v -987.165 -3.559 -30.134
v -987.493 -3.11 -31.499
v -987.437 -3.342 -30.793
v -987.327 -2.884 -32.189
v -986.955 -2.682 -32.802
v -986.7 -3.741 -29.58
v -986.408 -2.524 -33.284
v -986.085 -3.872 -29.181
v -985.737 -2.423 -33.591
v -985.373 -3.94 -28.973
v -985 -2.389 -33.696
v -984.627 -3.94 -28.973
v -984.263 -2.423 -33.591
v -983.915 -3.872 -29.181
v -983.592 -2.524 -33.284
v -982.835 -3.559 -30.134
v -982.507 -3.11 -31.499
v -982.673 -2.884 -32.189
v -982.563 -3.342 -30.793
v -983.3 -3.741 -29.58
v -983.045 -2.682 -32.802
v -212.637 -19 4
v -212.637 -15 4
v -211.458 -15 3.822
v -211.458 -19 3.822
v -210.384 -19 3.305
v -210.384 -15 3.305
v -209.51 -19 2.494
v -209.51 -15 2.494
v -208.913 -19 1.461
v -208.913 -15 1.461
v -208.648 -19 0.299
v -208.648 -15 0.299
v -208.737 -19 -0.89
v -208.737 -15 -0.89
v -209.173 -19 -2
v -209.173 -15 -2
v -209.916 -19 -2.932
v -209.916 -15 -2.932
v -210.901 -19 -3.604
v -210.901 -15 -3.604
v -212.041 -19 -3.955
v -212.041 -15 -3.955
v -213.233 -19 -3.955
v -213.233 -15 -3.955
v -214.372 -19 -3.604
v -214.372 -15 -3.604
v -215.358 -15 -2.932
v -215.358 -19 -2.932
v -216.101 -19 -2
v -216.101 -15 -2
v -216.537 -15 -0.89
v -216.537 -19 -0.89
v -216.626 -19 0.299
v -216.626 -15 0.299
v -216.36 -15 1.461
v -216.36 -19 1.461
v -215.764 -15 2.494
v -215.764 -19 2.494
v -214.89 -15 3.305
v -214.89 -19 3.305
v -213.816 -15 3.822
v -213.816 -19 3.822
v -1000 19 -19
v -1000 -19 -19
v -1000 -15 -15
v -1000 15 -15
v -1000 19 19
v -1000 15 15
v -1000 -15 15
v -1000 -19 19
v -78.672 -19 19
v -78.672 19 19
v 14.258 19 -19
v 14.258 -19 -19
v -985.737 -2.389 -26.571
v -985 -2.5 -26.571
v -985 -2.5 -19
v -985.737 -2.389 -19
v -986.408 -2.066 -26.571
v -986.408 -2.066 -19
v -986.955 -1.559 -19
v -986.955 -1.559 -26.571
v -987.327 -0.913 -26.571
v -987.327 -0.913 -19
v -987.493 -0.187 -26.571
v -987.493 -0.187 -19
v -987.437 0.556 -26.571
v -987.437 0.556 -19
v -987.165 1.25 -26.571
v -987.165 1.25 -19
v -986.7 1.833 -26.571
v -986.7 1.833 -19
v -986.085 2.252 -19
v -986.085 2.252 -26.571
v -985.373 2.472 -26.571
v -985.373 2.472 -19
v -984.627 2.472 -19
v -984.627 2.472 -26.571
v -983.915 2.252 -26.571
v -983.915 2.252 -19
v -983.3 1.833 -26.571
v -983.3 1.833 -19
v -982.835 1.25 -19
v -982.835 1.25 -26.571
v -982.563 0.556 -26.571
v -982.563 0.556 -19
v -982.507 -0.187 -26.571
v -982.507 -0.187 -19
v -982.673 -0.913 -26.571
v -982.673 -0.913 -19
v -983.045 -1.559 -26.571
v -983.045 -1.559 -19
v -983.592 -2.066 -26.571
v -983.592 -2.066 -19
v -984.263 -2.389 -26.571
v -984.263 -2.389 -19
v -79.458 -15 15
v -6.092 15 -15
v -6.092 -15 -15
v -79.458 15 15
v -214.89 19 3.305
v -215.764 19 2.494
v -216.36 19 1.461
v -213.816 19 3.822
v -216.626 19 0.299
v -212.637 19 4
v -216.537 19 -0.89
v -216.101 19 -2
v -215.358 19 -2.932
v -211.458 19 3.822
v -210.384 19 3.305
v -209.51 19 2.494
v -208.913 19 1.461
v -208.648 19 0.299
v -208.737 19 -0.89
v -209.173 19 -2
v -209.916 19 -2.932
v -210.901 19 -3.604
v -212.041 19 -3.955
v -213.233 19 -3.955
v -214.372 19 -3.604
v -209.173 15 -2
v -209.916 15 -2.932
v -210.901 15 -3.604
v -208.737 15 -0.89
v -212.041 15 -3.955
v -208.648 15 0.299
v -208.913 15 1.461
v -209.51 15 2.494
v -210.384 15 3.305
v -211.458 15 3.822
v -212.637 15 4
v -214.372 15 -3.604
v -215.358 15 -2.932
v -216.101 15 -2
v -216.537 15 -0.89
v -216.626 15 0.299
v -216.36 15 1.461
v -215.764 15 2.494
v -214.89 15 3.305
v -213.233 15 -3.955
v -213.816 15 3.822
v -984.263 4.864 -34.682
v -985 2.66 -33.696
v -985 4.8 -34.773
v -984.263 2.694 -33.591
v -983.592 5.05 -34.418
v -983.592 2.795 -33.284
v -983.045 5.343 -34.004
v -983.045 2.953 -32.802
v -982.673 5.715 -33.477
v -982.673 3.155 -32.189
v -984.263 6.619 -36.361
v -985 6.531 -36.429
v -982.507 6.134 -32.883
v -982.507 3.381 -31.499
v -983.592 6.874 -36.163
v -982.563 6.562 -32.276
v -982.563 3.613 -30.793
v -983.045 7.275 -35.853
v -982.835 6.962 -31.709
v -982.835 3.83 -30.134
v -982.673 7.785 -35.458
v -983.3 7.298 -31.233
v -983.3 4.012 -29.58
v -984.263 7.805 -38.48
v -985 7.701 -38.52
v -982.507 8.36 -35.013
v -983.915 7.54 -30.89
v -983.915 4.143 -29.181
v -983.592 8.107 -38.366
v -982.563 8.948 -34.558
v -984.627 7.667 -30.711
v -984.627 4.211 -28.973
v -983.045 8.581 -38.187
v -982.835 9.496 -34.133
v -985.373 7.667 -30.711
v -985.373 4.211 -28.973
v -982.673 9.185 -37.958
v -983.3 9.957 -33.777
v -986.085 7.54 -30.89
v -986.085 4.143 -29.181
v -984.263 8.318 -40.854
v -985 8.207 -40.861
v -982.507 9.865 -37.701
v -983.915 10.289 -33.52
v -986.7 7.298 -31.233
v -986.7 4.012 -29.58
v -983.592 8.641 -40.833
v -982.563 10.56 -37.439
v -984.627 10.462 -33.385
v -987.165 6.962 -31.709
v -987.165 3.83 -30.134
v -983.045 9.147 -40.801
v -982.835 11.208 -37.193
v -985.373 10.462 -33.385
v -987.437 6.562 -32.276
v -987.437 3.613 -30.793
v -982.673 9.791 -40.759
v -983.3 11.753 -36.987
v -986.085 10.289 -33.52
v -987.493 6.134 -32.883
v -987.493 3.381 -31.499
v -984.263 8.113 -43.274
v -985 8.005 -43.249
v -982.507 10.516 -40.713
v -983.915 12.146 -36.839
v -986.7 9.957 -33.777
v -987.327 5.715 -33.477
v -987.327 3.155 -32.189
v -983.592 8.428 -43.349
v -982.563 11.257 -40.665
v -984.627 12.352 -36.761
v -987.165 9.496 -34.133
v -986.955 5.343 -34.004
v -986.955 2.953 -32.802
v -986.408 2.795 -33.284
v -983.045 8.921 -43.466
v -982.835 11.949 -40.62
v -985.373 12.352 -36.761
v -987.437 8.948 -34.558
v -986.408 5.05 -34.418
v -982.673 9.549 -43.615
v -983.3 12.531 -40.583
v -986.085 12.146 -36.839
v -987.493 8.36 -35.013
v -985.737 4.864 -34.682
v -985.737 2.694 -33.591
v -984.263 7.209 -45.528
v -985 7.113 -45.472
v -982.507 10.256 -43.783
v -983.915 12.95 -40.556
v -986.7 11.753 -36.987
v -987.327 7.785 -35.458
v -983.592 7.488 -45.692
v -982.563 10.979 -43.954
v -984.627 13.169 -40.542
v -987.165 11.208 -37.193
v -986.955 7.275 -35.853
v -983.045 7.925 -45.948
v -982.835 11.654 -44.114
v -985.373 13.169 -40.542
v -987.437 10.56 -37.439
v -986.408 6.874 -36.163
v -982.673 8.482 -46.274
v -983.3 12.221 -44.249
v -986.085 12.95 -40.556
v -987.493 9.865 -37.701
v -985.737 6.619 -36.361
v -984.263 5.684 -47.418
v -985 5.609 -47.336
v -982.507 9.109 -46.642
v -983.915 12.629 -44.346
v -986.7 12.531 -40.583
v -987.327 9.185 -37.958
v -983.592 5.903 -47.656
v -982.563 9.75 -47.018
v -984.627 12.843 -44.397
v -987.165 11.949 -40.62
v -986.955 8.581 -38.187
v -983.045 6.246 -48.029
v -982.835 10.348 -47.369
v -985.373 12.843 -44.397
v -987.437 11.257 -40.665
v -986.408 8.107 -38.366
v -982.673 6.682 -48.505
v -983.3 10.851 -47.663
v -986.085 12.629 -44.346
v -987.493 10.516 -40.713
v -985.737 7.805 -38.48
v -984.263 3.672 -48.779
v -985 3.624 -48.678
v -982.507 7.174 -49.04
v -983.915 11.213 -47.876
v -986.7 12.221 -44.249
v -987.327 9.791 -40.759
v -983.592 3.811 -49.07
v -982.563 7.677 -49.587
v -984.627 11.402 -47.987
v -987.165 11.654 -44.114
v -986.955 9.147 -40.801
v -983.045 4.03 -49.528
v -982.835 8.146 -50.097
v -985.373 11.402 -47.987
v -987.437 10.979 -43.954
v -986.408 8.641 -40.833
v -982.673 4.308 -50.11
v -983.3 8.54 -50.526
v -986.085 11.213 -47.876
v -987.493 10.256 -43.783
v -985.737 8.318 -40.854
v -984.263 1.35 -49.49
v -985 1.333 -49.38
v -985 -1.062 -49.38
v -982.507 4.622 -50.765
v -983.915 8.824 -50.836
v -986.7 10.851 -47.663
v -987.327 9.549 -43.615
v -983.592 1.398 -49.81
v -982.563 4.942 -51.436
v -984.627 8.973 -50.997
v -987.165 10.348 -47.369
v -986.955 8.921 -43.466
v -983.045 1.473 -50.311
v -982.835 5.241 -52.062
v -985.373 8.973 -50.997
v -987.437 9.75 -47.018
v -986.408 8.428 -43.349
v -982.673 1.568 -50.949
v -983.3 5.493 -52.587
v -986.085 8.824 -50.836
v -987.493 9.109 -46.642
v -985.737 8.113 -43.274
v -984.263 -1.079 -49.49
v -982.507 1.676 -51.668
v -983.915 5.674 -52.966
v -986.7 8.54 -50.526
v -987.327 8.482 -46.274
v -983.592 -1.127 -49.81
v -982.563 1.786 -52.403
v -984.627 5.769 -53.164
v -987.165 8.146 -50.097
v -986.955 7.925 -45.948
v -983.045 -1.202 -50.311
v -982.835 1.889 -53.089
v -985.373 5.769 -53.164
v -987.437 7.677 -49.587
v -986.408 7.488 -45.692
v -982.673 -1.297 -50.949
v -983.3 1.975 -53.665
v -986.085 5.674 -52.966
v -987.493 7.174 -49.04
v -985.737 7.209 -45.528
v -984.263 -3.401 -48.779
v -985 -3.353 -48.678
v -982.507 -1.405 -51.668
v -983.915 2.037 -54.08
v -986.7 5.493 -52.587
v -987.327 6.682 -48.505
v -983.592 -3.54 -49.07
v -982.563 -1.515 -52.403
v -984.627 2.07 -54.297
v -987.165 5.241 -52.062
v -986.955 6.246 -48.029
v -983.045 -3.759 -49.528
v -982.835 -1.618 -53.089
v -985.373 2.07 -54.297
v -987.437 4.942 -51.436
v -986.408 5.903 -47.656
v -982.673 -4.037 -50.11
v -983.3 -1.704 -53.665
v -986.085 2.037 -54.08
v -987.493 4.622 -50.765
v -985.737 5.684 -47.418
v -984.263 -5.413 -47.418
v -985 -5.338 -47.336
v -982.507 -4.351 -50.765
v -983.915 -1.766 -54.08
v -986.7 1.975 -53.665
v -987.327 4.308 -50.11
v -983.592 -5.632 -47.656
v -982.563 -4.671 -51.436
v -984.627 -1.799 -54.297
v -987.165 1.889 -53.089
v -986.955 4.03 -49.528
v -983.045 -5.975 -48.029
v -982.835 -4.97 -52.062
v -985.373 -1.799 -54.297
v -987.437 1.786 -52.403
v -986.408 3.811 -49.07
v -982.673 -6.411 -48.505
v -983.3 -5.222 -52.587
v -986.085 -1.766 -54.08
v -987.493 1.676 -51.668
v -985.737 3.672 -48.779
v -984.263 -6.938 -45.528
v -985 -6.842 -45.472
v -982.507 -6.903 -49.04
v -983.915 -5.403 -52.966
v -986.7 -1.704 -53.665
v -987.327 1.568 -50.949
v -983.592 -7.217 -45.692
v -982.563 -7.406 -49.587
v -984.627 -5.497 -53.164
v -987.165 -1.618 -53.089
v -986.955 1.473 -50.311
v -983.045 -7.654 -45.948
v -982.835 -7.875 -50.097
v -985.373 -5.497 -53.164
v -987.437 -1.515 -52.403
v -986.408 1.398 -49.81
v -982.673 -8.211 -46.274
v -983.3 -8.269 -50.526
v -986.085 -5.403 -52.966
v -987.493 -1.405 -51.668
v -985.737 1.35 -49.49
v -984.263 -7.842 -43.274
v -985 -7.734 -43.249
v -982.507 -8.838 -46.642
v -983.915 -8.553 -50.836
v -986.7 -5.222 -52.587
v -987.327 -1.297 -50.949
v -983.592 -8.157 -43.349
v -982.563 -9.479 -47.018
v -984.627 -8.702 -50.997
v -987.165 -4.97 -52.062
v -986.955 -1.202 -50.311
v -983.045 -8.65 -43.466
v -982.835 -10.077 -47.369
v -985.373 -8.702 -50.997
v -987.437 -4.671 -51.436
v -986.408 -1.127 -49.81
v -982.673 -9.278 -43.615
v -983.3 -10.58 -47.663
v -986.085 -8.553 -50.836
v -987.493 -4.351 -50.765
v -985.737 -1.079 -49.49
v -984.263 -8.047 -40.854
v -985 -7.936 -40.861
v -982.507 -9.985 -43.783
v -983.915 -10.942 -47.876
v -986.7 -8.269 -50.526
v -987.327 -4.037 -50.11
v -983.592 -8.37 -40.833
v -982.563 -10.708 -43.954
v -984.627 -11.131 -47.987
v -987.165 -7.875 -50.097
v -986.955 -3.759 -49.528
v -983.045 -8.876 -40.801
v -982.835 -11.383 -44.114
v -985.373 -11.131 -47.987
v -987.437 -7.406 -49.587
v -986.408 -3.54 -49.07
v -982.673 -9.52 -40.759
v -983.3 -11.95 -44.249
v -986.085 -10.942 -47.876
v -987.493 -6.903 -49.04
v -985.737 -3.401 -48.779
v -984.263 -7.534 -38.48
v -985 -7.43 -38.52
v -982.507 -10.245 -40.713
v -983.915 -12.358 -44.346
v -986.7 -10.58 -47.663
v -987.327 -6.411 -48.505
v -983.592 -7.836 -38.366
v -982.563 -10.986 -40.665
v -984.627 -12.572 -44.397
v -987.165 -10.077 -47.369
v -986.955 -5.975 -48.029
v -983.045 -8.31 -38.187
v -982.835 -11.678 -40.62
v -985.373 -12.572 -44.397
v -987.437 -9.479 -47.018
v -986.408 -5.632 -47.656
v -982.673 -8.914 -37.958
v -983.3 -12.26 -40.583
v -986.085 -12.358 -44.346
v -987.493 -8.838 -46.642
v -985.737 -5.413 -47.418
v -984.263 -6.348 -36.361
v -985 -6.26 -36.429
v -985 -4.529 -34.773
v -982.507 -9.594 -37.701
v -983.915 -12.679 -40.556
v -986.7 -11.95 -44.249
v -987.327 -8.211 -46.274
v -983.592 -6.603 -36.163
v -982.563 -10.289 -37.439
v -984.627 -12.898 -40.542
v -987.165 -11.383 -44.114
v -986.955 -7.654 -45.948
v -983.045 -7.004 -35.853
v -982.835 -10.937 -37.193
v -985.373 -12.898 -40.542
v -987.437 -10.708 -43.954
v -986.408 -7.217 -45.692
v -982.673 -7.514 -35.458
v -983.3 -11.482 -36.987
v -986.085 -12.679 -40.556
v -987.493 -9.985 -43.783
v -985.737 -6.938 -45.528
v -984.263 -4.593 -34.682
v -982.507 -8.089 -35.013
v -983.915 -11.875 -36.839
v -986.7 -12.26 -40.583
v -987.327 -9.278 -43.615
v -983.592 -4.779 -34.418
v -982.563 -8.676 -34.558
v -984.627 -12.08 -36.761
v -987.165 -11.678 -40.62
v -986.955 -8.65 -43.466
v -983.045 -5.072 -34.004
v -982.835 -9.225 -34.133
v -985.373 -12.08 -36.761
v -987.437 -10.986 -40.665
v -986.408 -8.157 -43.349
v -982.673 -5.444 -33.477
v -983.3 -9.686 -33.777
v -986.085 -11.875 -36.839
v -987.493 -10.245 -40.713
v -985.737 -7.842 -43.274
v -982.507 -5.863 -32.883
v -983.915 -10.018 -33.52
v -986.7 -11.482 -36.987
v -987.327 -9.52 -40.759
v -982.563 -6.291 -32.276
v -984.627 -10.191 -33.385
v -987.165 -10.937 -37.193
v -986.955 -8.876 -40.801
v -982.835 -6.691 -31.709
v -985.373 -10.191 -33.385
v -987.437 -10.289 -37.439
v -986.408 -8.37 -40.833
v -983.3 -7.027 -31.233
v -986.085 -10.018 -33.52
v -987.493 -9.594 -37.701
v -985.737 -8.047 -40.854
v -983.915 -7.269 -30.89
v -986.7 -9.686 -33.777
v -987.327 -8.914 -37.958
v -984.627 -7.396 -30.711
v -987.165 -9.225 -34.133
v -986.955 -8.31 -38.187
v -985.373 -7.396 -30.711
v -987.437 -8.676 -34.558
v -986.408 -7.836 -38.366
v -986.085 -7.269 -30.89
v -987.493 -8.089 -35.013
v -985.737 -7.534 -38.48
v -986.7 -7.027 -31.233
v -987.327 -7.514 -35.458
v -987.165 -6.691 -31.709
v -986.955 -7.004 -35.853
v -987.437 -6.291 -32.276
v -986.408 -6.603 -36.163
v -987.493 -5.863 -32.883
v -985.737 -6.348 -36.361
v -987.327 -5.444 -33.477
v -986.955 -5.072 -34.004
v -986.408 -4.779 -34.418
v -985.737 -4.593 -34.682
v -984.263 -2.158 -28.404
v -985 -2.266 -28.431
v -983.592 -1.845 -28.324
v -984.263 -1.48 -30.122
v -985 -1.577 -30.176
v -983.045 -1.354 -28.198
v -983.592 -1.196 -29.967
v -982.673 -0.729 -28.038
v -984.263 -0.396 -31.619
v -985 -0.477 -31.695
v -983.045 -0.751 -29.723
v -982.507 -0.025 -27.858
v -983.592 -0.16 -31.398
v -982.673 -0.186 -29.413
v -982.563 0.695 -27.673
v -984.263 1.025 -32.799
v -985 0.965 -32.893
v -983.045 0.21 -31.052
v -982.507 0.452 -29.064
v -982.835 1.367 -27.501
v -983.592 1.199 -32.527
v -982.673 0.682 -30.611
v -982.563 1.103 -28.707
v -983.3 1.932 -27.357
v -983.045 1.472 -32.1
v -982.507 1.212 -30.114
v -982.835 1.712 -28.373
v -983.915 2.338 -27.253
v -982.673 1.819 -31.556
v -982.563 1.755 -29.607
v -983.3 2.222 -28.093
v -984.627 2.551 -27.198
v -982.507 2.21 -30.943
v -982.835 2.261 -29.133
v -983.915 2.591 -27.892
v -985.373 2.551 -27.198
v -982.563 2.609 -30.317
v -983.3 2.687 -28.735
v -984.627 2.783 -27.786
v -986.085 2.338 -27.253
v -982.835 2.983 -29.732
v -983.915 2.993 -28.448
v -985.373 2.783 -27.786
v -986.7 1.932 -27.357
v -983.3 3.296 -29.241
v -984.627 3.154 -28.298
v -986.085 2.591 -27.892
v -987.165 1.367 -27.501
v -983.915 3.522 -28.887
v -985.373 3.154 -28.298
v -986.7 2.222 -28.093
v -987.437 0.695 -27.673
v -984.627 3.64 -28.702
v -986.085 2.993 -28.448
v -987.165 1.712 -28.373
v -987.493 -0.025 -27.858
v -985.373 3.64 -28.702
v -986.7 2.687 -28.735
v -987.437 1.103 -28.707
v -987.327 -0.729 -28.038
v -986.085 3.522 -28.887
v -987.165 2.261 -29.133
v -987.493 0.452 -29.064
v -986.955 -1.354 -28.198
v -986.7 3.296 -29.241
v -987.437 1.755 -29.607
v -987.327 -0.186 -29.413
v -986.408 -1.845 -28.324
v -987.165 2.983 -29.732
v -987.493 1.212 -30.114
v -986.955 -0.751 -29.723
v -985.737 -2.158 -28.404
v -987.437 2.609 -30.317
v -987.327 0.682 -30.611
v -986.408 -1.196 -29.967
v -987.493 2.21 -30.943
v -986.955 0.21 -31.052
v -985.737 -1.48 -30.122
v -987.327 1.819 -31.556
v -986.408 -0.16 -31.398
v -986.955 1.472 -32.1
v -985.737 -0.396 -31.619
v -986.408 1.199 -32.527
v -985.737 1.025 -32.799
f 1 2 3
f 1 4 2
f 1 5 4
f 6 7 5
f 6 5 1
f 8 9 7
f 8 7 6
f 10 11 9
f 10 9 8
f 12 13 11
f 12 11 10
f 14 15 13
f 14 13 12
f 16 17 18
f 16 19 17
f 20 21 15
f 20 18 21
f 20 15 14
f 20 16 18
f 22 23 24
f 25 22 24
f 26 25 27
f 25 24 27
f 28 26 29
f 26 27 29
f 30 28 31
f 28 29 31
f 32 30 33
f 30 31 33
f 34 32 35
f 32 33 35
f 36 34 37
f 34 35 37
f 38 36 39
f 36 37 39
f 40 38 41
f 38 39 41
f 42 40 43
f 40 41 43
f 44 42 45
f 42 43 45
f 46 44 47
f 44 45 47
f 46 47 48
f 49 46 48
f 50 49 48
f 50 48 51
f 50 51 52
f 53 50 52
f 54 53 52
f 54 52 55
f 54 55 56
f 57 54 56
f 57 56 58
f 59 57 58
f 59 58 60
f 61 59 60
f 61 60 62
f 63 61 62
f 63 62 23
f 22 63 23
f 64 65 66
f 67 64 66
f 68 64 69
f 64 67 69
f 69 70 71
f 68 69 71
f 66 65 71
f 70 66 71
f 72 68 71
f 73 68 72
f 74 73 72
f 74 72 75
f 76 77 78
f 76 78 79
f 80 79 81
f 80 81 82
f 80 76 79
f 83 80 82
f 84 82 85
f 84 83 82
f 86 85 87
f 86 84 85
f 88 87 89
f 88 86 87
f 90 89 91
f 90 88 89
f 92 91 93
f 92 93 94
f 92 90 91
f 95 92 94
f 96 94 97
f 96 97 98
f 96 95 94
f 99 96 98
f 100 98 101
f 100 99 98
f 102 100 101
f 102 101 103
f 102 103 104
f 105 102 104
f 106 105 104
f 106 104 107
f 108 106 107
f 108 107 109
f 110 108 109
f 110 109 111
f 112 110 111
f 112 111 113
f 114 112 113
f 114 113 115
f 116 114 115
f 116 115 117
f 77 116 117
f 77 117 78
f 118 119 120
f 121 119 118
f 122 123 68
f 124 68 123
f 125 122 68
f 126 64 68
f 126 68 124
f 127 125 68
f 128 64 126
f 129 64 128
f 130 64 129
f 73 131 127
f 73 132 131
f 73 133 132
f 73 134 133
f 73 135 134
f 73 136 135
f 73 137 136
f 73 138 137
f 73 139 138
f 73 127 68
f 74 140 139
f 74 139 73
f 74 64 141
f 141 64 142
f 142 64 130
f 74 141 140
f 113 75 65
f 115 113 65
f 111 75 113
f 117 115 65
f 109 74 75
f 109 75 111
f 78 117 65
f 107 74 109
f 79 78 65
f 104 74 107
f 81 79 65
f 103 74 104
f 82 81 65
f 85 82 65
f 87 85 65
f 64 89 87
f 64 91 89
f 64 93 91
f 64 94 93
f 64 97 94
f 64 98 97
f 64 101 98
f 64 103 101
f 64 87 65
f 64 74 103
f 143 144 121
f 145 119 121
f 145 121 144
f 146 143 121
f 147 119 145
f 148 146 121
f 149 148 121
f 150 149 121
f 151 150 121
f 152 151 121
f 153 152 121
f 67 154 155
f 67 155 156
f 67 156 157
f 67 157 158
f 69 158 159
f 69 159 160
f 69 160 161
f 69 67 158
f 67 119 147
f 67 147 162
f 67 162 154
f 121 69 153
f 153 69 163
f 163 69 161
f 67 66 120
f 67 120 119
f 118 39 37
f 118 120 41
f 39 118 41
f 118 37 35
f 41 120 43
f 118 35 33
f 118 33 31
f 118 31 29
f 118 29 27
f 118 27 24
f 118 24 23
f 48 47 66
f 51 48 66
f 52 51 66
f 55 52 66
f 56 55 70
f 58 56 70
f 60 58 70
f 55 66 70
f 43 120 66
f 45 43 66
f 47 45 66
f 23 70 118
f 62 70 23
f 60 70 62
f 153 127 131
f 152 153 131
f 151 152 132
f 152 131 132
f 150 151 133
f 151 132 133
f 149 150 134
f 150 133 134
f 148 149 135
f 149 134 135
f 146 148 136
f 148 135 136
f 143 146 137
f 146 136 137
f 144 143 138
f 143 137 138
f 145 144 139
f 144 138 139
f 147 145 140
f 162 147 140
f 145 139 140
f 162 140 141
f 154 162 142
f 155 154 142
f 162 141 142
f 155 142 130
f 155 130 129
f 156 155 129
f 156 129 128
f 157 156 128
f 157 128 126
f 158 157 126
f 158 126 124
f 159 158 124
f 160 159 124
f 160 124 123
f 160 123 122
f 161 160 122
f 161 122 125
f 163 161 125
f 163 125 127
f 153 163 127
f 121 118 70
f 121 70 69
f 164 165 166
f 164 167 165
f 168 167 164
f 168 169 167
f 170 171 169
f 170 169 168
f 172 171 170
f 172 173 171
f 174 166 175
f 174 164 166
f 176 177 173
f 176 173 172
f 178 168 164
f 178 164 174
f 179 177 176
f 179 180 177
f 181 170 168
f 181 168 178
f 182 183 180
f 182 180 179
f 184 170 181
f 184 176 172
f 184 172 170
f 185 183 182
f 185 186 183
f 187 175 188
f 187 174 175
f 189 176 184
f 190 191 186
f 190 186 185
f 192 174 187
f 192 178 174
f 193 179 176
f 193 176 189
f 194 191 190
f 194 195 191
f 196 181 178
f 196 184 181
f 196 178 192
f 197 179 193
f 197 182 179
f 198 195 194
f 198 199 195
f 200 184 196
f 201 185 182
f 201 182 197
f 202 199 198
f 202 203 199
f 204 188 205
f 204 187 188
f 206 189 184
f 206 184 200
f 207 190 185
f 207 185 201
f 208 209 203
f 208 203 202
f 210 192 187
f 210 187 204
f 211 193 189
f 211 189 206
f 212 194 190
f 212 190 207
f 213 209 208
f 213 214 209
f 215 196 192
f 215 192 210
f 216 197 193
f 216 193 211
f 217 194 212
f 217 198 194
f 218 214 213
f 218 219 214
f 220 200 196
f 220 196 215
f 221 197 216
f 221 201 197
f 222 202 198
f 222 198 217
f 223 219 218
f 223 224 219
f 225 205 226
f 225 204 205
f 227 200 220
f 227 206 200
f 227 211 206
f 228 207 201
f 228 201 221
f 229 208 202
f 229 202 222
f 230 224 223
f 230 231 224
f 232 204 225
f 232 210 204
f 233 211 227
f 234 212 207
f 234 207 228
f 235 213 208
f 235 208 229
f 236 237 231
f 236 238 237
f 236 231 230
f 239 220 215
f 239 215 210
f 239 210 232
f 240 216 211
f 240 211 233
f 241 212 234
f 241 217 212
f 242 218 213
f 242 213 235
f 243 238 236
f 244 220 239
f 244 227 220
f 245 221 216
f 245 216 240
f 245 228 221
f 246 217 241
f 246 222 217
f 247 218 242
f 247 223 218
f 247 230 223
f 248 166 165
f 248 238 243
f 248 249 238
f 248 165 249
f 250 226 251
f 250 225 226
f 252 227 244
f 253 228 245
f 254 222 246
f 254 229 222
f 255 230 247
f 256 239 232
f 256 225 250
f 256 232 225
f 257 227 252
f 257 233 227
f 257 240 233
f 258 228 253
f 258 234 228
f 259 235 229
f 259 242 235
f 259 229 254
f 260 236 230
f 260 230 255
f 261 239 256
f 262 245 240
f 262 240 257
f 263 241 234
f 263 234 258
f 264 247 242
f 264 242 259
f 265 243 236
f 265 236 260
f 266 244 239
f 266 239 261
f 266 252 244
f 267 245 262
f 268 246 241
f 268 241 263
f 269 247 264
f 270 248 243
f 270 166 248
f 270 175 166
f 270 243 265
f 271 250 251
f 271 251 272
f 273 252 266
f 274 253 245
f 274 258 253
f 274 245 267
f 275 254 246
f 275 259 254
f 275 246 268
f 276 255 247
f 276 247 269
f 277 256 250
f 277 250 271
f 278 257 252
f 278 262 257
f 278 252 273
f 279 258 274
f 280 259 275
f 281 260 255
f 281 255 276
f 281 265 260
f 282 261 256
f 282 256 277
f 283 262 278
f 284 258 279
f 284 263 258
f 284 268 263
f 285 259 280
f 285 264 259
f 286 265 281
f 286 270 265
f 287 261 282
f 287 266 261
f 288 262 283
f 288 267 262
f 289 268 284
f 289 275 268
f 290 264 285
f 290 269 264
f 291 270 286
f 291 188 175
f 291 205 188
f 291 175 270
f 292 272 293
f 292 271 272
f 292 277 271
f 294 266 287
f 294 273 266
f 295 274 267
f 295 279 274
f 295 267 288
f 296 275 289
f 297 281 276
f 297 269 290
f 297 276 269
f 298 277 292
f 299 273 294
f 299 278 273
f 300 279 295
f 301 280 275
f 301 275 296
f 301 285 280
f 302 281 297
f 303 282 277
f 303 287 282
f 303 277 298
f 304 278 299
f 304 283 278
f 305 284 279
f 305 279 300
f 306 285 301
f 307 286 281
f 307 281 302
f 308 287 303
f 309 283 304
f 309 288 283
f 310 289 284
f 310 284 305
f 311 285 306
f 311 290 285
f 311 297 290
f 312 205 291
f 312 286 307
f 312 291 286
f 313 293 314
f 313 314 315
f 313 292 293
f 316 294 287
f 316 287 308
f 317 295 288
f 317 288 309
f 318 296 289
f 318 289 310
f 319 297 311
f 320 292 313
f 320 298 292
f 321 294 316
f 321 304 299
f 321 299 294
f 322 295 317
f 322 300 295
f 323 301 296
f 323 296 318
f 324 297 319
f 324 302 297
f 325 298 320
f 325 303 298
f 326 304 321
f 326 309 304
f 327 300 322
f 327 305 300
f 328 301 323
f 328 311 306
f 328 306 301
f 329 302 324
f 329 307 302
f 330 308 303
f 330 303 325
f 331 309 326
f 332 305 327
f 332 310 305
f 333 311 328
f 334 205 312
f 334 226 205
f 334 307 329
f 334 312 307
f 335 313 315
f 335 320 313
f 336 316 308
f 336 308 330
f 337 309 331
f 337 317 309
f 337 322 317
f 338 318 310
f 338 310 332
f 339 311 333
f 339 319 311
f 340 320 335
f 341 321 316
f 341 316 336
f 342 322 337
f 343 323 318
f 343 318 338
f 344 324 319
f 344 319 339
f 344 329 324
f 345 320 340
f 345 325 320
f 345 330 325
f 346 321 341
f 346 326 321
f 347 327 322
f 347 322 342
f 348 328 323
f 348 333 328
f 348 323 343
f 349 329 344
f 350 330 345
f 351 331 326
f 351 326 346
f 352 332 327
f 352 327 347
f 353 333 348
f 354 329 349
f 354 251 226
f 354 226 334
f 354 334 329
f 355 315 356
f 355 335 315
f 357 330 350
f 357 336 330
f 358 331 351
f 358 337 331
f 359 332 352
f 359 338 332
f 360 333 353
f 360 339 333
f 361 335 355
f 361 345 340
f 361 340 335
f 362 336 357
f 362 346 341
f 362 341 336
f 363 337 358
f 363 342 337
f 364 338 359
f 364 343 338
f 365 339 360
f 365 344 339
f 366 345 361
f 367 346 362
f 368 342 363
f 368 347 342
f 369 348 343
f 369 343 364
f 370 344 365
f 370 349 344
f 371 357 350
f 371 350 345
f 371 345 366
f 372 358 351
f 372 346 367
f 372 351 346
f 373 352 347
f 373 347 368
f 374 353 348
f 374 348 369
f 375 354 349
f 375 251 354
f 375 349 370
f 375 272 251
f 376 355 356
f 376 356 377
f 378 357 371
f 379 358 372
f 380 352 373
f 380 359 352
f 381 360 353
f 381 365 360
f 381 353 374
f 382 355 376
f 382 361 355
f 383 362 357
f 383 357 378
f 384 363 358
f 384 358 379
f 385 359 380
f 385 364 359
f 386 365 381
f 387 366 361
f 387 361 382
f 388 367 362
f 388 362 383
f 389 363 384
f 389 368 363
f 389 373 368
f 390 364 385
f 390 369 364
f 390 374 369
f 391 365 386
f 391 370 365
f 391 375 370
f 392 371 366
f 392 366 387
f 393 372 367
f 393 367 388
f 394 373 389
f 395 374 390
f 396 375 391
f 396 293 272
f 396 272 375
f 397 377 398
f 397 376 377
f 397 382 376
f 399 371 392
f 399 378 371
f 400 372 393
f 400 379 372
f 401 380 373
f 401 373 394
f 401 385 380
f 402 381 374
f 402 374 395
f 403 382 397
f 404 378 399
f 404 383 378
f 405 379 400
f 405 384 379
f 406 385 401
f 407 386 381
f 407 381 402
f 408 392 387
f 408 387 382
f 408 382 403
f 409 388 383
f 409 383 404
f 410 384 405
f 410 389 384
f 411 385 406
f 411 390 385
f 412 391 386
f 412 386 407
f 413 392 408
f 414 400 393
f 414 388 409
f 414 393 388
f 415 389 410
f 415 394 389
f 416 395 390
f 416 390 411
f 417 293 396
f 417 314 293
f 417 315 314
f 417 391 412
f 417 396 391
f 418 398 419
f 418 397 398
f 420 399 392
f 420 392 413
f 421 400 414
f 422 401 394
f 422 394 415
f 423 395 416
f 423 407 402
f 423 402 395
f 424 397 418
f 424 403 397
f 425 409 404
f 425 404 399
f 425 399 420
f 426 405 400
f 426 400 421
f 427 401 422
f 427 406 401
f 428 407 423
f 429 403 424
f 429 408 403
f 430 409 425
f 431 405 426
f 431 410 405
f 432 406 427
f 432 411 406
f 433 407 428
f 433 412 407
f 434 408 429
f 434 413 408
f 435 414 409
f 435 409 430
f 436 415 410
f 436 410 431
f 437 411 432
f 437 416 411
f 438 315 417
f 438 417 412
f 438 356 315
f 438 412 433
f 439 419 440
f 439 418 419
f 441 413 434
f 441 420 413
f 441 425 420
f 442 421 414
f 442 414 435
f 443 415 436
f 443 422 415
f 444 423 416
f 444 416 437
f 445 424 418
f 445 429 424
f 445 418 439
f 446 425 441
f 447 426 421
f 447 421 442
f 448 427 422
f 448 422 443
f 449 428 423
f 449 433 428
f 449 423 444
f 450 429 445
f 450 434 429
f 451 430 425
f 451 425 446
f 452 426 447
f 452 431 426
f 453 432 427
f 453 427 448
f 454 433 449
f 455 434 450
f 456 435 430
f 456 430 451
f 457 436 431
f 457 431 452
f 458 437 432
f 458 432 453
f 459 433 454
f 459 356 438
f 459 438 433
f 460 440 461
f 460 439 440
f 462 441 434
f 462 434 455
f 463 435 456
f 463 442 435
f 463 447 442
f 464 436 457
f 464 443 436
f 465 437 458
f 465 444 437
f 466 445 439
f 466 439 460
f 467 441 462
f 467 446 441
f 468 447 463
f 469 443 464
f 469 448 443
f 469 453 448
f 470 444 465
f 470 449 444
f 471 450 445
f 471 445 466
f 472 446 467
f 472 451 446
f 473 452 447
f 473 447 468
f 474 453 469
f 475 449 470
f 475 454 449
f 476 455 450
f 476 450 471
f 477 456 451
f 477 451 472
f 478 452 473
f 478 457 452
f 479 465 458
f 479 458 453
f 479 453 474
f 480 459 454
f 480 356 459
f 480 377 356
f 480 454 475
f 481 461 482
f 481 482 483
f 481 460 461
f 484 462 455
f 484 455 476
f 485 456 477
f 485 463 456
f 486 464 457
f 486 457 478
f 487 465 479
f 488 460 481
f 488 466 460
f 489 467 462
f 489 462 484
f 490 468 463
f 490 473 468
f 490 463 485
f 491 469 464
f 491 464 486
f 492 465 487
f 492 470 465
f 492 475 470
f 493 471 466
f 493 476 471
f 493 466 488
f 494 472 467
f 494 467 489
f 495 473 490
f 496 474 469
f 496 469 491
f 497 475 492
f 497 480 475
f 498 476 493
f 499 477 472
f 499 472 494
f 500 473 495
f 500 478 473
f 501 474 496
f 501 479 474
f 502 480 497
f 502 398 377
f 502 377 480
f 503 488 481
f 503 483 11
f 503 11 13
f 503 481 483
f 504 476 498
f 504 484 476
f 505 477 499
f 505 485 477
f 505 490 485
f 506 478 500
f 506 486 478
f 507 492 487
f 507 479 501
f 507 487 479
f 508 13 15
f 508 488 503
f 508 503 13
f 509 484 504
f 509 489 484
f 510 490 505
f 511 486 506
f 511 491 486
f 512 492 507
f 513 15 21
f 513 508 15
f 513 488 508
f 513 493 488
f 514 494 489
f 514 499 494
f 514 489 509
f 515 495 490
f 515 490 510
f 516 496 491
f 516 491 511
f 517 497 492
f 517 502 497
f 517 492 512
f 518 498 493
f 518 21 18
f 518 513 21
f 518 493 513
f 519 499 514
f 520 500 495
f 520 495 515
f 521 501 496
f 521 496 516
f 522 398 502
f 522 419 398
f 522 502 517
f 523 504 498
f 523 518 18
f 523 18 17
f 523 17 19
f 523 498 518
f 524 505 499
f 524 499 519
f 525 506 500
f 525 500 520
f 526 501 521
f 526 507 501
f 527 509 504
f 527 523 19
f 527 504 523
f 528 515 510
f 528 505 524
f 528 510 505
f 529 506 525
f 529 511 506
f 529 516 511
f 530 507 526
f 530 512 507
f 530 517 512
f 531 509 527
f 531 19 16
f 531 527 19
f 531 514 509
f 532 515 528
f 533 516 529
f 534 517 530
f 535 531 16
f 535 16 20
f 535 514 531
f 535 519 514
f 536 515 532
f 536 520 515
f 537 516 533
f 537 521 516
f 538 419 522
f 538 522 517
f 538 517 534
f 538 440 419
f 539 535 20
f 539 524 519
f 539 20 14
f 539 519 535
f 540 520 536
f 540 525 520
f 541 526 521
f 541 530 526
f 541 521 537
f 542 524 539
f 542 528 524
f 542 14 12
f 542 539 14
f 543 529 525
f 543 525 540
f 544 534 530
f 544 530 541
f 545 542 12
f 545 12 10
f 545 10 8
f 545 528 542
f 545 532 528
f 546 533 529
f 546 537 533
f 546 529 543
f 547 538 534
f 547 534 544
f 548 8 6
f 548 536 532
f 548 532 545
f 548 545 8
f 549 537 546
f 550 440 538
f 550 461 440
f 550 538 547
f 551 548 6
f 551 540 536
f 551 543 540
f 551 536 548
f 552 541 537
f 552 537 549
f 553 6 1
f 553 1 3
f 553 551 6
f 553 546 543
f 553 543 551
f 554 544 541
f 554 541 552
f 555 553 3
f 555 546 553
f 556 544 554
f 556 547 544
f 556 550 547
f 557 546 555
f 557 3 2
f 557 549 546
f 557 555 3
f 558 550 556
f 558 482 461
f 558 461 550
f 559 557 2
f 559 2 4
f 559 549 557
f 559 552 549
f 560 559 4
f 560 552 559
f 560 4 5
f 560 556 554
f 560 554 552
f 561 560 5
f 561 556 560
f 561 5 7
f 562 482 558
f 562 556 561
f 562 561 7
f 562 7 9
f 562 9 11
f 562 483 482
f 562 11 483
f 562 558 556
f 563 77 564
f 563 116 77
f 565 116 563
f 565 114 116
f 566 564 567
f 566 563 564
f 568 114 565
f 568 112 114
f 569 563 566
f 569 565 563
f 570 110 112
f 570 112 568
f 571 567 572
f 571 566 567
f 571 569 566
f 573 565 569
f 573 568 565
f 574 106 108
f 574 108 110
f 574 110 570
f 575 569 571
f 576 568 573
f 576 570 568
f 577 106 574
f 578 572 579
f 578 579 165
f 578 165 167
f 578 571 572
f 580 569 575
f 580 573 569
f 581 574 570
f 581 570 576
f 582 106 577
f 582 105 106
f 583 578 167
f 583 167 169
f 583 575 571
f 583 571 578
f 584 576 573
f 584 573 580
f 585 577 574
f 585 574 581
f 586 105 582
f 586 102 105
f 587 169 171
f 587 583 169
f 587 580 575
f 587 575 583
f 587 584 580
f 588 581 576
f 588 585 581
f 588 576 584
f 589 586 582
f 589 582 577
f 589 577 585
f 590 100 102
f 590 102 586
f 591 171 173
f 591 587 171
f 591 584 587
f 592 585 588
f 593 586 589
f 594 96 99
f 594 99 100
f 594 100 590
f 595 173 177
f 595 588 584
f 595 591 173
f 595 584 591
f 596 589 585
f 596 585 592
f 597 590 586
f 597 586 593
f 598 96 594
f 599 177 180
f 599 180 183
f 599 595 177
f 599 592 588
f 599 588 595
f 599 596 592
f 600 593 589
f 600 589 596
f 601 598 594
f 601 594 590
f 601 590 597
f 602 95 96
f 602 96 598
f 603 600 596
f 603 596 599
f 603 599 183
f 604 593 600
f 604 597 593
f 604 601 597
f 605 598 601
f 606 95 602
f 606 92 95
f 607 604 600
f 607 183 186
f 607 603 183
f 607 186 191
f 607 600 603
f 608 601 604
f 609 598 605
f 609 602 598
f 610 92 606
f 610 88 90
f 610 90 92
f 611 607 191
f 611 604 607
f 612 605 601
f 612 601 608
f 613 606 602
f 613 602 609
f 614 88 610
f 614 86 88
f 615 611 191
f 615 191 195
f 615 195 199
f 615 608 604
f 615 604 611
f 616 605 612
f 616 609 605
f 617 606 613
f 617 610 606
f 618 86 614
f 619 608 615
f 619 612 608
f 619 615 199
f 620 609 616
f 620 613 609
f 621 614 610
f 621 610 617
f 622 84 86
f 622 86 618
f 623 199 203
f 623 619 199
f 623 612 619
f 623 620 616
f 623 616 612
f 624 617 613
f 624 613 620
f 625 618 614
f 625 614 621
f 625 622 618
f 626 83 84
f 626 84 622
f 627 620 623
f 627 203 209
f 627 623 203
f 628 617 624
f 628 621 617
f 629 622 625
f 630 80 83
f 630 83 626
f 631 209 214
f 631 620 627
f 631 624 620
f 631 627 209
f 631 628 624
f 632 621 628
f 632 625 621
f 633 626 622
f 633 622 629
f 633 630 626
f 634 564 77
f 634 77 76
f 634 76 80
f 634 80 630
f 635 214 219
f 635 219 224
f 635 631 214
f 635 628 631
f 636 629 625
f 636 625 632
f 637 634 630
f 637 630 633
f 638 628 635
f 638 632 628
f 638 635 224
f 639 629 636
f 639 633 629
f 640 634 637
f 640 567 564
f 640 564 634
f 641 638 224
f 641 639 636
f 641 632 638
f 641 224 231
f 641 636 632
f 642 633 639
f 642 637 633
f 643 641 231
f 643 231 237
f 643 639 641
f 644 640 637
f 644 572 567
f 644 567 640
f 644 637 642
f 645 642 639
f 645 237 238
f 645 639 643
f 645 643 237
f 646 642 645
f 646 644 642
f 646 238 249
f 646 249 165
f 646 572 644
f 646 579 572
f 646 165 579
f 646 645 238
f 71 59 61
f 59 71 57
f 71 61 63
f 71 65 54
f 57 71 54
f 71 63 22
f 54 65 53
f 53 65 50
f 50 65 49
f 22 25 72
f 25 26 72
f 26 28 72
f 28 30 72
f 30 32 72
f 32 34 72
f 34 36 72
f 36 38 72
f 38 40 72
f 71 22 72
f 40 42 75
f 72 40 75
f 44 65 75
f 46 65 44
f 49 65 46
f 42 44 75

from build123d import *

# Parameters (mm, degrees)
SKETCH2_W           = 38
SKETCH2_H           = 38
SKETCH3_W           = 30
SKETCH3_H           = 30
SKETCH4_R           = 4
CUT_EXTRUDE1_DEPTH  = 1001.902093114
SWEEP2_PROFILE_R    = 2.5
CUT_EXTRUDE2_DEPTH  = 1003.203029253
BOSS_EXTRUDE1_DEPTH = 38
SKETCH22_W          = 30
SKETCH22_H          = 30
CUT_EXTRUDE3_DEPTH  = 1074.472400545
CUT_EXTRUDE4_DEPTH  = 1003.203029253
CUT_EXTRUDE5_DEPTH  = 1003.203029253
BOSS_EXTRUDE2_REACH = 1004.203


with BuildPart() as part:
    # Sweep1: sweep along a path in Sketch1
    with BuildLine(Plane(origin=(0, 0, 0), x_dir=(1, 0, 0), z_dir=(0, 1, 0))) as sweep1_path:
        Line((0, 0), (-1000, 0))
    # Sketch2 → Sweep1 (sweep)
    with BuildSketch(Plane(origin=(0, 0, 0), x_dir=(0, 0, -1), z_dir=(1, 0, 0))):
        Rectangle(SKETCH2_W, SKETCH2_H)
    sweep(path=sweep1_path.line)

    # Cut-Sweep1: sweep along a path in Sketch1<2>
    with BuildLine(Plane(origin=(0, 0, 0), x_dir=(1, 0, 0), z_dir=(0, 1, 0))) as cut_sweep1_path:
        Line((0, 0), (-1000, 0))
    # Sketch3 → Cut-Sweep1 (sweep, cut)
    with BuildSketch(Plane(origin=(0, 0, 0), x_dir=(0, 0, -1), z_dir=(1, 0, 0))):
        Rectangle(SKETCH3_W, SKETCH3_H)
    sweep(path=cut_sweep1_path.line, mode=Mode.SUBTRACT)

    # Sketch4 → Cut-Extrude1 (cut, through all)
    with BuildSketch(Plane(origin=(0, 19, 0), x_dir=(1, 0, 0), z_dir=(0, 1, 0))):
        with Locations((-212.63683242, 0)):
            Circle(SKETCH4_R)
    extrude(amount=-CUT_EXTRUDE1_DEPTH, mode=Mode.SUBTRACT)

    # Sweep2: sweep along a path in Sketch5
    with BuildLine(Plane.ZY.offset(985)) as sweep2_path:
        Line((-19, 0), (-26.570946825, 0))
        ThreePointArc((-26.570946825, 0), (-29.503401087, 0.950220747), (-31.321263798, 3.4397152))
        ThreePointArc((-31.321263798, 3.4397152), (-51.969366005, 0.135523131), (-31.321263798, -3.168668939))
    # Sweep2 profile (on start of the path) → Sweep2 (sweep)
    with BuildSketch(Plane(origin=(-985, 0, -19), x_dir=(0, -1, 0), z_dir=(0, 0, -1))):
        Circle(SWEEP2_PROFILE_R)
    sweep(path=sweep2_path.line)

    # Sketch16 → Cut-Extrude2 (cut, through all)
    with BuildSketch(Plane(origin=(0, 19, 0), x_dir=(1, 0, 0), z_dir=(0, 1, 0))):
        Polygon((0, -19), (0, 19), (-71.907398101, -19), align=None)
    extrude(amount=-CUT_EXTRUDE2_DEPTH, mode=Mode.SUBTRACT)

    # Sketch17 → Boss-Extrude1 (add)
    with BuildSketch(Plane(origin=(0, 19, 0), x_dir=(1, 0, 0), z_dir=(0, 1, 0))):
        Polygon((-71.907398101, -19), (0, -19), (71.921211139, 19), (0, 19), align=None)
    extrude(amount=-BOSS_EXTRUDE1_DEPTH)

    # Sketch22 → Cut-Extrude3 (cut, through all)
    with BuildSketch(Plane.ZY.offset(1000)):
        Rectangle(SKETCH22_W, SKETCH22_H)
    extrude(amount=-CUT_EXTRUDE3_DEPTH, mode=Mode.SUBTRACT)

    # Sketch23 → Cut-Extrude4 (cut, through all)
    with BuildSketch(Plane(origin=(0, 19, 0), x_dir=(1, 0, 0), z_dir=(0, 1, 0))):
        Polygon((14.258492684, 0), (-32.20683242, -19), (0, -19), (71.921211139, 19), (60.723817789, 19), align=None)
    extrude(amount=-CUT_EXTRUDE4_DEPTH, mode=Mode.SUBTRACT)

    # Sketch24 → Cut-Extrude5 (cut, through all)
    with BuildSketch(Plane(origin=(0, 19, 0), x_dir=(1, 0, 0), z_dir=(0, 1, 0))):
        Polygon((-78.672157524, -19), (14.258492684, 19), (60.723817789, 19), (-32.20683242, -19), align=None)
    extrude(amount=-CUT_EXTRUDE5_DEPTH, mode=Mode.SUBTRACT)

    # Sketch25 → Boss-Extrude2 (add, up to next)
    with BuildSketch(Plane(origin=(0, 19, 0), x_dir=(1, 0, 0), z_dir=(0, 1, 0)), mode=Mode.PRIVATE) as boss_extrude2_sk1:
        Polygon((3.690100071, 19), (-89.240550137, -19), (-78.672157524, -19), (14.258492684, 19), align=None)
    boss_extrude2_tool1 = extrude(boss_extrude2_sk1.sketch, amount=-BOSS_EXTRUDE2_REACH, mode=Mode.PRIVATE) - part.part
    add(boss_extrude2_tool1.solids().sort_by_distance((-37.491029, 19, 0))[0])


solid = part.part
